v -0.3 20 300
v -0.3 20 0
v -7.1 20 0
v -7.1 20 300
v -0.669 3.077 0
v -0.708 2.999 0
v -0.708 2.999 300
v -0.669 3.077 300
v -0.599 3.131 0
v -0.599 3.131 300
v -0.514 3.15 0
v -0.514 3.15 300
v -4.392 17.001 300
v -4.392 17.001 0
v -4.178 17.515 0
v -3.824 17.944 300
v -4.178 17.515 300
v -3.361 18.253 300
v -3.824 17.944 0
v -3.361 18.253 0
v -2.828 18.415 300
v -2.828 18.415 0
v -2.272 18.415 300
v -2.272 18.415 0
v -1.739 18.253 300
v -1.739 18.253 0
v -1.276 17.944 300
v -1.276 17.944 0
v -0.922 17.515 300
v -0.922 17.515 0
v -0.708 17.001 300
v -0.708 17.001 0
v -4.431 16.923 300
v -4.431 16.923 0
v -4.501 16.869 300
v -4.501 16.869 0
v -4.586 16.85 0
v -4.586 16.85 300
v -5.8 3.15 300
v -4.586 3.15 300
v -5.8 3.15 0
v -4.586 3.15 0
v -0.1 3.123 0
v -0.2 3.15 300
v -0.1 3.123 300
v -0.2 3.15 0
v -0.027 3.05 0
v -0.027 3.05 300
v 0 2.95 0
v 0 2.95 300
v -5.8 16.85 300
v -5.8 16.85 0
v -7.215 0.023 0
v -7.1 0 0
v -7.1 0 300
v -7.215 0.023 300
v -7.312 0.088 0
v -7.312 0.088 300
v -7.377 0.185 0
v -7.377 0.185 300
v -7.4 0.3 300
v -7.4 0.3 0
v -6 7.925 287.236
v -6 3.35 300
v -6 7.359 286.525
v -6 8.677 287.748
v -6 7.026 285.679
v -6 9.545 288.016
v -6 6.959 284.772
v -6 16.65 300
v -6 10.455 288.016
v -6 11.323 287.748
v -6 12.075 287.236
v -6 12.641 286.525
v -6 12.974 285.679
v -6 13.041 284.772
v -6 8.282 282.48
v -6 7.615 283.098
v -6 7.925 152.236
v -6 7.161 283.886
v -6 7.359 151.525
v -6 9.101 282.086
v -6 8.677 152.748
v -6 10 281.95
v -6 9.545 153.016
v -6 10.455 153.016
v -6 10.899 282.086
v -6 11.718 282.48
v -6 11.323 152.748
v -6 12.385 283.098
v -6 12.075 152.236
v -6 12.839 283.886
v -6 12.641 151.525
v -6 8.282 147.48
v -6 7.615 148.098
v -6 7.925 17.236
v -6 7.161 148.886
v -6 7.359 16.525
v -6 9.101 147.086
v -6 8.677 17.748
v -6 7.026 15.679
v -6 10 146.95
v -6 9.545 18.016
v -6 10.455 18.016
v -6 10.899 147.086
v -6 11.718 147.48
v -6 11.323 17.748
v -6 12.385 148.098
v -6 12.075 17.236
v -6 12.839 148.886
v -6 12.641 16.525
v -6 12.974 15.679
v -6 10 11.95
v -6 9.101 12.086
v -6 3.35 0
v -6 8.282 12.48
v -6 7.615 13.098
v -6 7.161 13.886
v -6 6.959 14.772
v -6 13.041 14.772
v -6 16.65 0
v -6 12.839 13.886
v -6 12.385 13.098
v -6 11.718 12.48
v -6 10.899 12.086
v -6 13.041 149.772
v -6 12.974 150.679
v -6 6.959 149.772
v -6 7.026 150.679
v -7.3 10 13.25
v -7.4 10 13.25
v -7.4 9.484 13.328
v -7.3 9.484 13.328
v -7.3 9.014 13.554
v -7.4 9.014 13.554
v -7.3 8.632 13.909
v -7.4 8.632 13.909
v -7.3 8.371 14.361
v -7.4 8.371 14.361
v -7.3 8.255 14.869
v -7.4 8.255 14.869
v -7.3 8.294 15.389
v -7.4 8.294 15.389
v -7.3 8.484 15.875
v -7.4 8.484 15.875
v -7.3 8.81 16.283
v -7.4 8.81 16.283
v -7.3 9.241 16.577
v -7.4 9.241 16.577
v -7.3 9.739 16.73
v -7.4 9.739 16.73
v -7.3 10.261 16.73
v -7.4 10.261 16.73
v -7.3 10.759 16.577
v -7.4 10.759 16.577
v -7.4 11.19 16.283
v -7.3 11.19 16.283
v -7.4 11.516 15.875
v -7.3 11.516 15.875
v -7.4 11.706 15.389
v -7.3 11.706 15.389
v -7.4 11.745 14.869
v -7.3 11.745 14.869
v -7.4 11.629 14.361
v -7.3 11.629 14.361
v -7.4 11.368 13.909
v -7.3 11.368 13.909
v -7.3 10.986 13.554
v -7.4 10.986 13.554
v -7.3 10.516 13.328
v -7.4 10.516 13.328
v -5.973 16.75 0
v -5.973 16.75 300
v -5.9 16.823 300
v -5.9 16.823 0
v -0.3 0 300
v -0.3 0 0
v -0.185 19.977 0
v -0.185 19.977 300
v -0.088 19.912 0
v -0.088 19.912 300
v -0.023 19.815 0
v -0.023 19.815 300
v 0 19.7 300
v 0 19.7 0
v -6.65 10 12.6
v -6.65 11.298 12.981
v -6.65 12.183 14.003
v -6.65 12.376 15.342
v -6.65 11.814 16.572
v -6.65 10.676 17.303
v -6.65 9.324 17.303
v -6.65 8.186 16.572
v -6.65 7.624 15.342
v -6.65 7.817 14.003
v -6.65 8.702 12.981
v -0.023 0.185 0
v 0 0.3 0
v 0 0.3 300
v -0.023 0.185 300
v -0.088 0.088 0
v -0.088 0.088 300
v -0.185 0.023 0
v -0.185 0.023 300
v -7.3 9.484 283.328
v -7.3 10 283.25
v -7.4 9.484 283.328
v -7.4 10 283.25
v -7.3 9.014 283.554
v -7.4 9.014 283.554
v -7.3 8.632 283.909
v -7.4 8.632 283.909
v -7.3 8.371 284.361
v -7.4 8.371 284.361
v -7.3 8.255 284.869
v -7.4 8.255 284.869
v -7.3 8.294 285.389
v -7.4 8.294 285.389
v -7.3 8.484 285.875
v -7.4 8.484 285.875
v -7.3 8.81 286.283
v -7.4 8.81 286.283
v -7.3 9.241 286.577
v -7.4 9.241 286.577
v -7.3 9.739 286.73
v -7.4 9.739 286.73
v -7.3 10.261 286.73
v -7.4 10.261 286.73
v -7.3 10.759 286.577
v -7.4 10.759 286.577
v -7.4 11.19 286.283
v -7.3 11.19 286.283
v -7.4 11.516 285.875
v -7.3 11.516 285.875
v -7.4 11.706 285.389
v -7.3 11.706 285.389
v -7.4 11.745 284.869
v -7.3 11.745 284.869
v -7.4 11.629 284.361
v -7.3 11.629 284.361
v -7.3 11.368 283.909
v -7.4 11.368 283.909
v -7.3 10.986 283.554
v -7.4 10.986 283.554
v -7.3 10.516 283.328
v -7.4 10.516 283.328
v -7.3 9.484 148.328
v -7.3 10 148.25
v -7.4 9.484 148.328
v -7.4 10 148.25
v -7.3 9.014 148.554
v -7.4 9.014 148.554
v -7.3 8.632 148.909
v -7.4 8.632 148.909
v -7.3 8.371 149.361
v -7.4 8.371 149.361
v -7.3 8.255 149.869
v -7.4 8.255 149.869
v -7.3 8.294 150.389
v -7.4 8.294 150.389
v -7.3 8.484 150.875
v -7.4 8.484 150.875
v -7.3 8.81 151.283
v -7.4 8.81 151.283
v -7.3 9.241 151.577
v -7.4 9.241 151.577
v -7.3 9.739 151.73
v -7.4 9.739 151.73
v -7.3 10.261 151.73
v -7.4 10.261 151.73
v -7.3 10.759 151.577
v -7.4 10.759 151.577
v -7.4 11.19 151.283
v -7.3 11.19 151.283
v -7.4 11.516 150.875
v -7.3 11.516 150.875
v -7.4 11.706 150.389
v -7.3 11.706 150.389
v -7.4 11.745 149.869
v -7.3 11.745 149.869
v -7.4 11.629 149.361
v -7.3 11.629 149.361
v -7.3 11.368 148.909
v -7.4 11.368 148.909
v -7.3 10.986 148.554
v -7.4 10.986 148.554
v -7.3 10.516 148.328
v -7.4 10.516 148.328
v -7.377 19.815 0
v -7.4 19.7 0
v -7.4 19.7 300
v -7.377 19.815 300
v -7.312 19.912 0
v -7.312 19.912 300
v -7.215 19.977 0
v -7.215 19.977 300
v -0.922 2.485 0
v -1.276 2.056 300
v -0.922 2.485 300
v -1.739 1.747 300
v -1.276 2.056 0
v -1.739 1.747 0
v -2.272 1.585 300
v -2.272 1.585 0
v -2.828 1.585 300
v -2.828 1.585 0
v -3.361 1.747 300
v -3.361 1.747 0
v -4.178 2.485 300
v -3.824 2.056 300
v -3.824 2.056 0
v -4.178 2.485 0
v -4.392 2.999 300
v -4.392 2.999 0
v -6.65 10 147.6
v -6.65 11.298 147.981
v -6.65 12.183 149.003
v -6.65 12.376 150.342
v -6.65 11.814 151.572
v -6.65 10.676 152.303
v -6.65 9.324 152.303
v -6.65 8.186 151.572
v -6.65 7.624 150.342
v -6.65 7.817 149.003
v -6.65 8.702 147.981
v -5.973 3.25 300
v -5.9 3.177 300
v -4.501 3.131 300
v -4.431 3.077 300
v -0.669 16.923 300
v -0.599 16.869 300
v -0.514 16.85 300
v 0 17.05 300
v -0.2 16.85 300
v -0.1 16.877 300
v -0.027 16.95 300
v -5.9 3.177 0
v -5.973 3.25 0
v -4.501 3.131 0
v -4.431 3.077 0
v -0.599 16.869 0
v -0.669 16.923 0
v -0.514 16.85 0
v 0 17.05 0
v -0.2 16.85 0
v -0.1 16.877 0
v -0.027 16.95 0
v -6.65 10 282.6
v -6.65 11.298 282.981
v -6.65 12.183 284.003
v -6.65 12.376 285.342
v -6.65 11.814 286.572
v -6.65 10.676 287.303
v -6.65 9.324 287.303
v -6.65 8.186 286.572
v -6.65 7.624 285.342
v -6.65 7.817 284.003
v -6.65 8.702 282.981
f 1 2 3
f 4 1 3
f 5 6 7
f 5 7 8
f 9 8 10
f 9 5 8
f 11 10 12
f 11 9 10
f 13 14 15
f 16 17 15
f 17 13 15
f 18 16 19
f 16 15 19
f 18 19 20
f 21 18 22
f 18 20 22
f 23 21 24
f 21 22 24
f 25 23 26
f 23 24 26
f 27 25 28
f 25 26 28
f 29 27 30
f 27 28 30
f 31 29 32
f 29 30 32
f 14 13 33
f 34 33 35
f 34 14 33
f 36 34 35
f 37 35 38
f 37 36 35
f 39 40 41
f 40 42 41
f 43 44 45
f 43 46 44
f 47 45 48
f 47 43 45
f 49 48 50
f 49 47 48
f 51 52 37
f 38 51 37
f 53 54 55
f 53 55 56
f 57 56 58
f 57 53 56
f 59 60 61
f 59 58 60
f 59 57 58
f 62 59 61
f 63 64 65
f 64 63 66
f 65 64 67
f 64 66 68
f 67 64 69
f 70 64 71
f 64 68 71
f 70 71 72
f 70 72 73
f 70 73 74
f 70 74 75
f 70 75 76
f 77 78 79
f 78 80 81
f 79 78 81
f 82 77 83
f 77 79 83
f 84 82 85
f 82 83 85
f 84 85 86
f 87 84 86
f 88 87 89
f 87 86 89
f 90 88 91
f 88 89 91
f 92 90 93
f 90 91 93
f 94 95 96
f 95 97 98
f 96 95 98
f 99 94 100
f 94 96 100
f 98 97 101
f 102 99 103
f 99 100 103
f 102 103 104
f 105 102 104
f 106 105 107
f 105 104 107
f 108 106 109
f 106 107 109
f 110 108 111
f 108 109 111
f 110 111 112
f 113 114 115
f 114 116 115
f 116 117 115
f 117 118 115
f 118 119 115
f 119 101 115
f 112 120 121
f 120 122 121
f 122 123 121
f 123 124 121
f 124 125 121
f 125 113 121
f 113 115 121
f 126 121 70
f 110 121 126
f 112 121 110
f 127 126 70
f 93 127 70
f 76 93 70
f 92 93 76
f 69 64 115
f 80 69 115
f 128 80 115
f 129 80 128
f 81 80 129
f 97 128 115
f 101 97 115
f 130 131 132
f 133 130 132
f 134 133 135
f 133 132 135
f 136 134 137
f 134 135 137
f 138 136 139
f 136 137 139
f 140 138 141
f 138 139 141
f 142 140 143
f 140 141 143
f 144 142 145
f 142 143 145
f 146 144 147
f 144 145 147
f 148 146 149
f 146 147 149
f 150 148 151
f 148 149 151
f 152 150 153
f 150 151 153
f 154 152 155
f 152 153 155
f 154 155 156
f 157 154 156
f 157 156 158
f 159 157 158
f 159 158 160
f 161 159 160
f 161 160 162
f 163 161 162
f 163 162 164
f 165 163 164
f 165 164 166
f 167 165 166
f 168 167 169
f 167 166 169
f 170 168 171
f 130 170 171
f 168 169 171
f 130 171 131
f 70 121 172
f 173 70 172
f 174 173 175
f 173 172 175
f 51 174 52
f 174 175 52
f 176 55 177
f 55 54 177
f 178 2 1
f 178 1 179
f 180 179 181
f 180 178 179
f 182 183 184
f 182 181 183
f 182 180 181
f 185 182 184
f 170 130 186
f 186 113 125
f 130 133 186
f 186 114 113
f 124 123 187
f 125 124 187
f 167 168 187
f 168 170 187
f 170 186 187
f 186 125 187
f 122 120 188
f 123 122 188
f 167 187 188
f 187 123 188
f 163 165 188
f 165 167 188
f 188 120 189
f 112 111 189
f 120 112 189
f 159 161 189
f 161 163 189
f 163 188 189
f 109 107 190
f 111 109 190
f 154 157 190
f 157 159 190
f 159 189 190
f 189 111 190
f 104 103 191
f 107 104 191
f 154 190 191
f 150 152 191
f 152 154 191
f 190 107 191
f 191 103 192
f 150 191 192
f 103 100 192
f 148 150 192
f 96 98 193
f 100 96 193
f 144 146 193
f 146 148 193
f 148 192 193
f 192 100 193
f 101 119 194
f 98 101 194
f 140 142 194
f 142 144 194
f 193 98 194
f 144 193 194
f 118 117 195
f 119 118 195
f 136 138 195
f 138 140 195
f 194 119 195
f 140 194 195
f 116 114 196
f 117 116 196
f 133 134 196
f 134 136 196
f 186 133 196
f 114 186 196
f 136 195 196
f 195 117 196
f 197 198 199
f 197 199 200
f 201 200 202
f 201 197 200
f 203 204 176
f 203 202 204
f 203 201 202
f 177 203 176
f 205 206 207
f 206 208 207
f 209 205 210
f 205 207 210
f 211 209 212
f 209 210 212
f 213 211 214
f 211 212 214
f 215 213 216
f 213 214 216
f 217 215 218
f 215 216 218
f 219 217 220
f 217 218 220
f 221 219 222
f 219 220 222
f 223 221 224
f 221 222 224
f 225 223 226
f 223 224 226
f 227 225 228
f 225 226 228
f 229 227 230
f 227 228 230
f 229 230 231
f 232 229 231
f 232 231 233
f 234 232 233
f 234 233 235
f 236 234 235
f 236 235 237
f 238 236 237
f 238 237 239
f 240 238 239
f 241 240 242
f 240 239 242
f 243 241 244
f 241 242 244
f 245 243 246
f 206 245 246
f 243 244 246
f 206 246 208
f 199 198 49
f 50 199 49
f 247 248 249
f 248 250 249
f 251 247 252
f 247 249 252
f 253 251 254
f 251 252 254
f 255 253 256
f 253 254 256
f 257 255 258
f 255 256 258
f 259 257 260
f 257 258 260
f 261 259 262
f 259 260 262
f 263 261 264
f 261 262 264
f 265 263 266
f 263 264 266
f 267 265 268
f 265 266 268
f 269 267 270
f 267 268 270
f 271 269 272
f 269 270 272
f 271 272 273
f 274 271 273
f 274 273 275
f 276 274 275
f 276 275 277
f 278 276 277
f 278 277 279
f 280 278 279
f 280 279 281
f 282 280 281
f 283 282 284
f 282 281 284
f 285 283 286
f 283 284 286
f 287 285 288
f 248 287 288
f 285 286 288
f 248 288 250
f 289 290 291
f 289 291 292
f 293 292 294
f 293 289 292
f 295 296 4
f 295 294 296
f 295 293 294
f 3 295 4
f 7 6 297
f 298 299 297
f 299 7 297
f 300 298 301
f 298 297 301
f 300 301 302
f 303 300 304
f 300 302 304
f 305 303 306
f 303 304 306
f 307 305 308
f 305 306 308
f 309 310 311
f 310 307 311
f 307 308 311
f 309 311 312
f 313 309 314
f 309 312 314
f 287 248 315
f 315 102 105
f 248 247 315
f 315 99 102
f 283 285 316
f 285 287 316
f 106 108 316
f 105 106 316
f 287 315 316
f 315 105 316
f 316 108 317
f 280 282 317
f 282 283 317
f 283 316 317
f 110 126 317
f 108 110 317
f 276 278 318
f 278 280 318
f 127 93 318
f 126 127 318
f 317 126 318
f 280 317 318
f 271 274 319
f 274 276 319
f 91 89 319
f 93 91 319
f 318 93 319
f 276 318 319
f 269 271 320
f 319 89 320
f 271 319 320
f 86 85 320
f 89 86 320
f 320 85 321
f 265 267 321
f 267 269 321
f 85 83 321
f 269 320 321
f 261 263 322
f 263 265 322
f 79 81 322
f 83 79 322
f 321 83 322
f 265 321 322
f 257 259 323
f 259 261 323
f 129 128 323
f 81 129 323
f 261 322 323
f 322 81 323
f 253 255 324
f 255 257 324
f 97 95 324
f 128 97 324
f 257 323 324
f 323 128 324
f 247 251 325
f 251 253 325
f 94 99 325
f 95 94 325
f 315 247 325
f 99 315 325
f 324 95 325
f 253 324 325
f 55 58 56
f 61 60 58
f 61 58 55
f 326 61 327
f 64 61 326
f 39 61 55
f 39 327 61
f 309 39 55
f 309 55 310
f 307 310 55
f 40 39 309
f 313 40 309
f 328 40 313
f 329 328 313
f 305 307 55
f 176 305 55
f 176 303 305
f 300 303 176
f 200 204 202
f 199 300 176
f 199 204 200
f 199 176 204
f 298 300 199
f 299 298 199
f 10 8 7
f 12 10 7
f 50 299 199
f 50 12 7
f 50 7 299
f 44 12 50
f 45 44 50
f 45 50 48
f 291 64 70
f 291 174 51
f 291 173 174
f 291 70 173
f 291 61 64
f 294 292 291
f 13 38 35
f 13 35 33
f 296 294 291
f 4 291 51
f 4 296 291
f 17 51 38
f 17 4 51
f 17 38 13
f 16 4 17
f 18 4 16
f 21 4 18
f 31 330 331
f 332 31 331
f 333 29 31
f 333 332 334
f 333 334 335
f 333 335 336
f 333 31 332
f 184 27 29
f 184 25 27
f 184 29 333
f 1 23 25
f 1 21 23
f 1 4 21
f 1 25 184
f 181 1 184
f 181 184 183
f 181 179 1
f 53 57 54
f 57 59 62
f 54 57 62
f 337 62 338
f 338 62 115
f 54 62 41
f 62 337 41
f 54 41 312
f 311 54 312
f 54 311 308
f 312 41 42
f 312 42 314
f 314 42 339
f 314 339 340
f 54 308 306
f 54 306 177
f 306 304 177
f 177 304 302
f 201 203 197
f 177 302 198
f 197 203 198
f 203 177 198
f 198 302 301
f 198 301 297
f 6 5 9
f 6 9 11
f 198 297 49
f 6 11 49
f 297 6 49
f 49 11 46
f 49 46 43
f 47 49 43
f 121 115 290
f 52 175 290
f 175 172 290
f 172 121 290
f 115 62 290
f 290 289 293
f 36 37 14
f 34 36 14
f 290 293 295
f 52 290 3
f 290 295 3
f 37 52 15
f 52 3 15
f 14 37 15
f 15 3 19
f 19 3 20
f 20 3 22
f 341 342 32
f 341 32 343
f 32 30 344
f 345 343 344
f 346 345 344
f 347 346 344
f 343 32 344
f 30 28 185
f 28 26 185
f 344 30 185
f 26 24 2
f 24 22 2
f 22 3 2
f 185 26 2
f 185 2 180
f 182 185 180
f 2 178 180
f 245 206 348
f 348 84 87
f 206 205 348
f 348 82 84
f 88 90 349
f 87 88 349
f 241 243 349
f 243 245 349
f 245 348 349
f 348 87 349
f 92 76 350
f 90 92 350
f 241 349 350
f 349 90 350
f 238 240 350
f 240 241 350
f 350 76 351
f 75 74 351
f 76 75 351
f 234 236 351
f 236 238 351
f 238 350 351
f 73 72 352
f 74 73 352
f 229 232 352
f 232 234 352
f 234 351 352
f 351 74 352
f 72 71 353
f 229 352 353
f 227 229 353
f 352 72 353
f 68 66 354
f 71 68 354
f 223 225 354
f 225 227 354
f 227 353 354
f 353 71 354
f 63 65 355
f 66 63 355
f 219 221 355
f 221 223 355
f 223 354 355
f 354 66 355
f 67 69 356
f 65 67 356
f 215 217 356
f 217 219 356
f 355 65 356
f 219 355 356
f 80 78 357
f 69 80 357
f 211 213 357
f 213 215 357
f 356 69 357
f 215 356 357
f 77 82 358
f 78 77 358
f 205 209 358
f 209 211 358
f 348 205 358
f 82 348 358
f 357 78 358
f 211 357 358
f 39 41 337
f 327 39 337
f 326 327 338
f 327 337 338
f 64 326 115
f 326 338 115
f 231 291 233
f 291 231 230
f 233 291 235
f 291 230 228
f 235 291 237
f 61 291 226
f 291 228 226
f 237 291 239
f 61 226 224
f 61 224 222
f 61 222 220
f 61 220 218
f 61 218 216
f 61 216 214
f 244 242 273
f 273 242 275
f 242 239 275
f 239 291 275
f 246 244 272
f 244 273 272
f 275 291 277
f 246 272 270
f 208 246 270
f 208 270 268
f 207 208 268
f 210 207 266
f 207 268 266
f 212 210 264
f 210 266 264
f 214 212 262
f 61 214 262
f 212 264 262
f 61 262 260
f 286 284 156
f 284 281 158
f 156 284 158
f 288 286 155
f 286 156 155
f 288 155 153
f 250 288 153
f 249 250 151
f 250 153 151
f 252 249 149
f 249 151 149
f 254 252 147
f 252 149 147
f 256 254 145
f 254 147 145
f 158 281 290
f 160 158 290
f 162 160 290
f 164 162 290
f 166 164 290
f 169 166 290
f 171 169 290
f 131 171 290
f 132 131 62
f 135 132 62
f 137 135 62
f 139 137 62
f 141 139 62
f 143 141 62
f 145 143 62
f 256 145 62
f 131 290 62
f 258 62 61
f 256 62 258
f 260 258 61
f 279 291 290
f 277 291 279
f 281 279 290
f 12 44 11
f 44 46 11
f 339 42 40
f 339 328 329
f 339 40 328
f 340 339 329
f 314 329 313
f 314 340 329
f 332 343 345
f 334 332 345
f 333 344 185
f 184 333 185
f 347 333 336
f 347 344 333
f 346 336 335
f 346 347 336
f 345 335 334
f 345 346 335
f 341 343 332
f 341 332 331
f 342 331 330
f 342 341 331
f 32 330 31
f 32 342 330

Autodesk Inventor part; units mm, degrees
sketch "Sketch_1" plane through (0, 0, 0) normal (0, 0, 1) x (1, 0, 0)
  line L0 (-7.4, 19.7) -> (-7.4, 0.3)
  arc A0 (-7.4, 0.3) -> (-7.1, 0) centre (-7.1, 0.3) ccw
  line L1 (-7.1, 0) -> (-0.3, 0)
  arc A1 (-0.3, 0) -> (0, 0.3) centre (-0.3, 0.3) ccw
  line L2 (0, 0.3) -> (0, 2.95)
  arc A2 (0, 2.95) -> (-0.2, 3.15) centre (-0.2, 2.95) ccw
  line L3 (-0.2, 3.15) -> (-0.5141, 3.15)
  arc A3 (-0.5141, 3.15) -> (-0.708, 2.999) centre (-0.5141, 2.95) ccw
  arc A4 (-4.392, 2.999) -> (-0.708, 2.999) centre (-2.55, 3.465) ccw
  arc A5 (-4.392, 2.999) -> (-4.5859, 3.15) centre (-4.5859, 2.95) ccw
  line L4 (-4.5859, 3.15) -> (-5.8, 3.15)
  arc A6 (-6, 3.35) -> (-5.8, 3.15) centre (-5.8, 3.35) ccw
  line L5 (-6, 3.35) -> (-6, 16.65)
  arc A7 (-5.8, 16.85) -> (-6, 16.65) centre (-5.8, 16.65) ccw
  line L6 (-5.8, 16.85) -> (-4.5859, 16.85)
  arc A8 (-4.5859, 16.85) -> (-4.392, 17.001) centre (-4.5859, 17.05) ccw
  arc A9 (-0.708, 17.001) -> (-4.392, 17.001) centre (-2.55, 16.535) ccw
  arc A10 (-0.708, 17.001) -> (-0.5141, 16.85) centre (-0.5141, 17.05) ccw
  line L7 (-0.5141, 16.85) -> (-0.2, 16.85)
  arc A11 (-0.2, 16.85) -> (0, 17.05) centre (-0.2, 17.05) ccw
  line L8 (0, 17.05) -> (0, 19.7)
  arc A12 (0, 19.7) -> (-0.3, 20) centre (-0.3, 19.7) ccw
  line L9 (-0.3, 20) -> (-7.1, 20)
  arc A13 (-7.1, 20) -> (-7.4, 19.7) centre (-7.1, 19.7) ccw
extrude "Extrusion1" add sketch "Sketch_1" along normal blind 300
sketch "Sketch2" plane through (-6, 3.35, 0) normal (1, 0, 0) x (0, 0, -1)
  point P0 (-15, 6.65)
hole "Hole1" at (-6, 10, 15) direction (-1, 0, 0) diameter 3.5 depth 1.4 countersink diameter 6.1 countersink angle 90
pattern_linear "Rectangular Pattern1" count 3 spacing 135 along (0, 0, 1) of "Hole1"
ref_plane "to_rail_XY" through (0.6, 10, 150) normal (0, 0, 1) x (1, 0, 0)
ref_plane "to_rail_YZ" through (0.6, 10, 150) normal (1, 0, 0) x (0, 1, 0)
ref_plane "to_rail_ZX" through (0.6, 10, 150) normal (0, 1, 0) x (0, 0, 1)
properties part number "SAR330-30_b"
